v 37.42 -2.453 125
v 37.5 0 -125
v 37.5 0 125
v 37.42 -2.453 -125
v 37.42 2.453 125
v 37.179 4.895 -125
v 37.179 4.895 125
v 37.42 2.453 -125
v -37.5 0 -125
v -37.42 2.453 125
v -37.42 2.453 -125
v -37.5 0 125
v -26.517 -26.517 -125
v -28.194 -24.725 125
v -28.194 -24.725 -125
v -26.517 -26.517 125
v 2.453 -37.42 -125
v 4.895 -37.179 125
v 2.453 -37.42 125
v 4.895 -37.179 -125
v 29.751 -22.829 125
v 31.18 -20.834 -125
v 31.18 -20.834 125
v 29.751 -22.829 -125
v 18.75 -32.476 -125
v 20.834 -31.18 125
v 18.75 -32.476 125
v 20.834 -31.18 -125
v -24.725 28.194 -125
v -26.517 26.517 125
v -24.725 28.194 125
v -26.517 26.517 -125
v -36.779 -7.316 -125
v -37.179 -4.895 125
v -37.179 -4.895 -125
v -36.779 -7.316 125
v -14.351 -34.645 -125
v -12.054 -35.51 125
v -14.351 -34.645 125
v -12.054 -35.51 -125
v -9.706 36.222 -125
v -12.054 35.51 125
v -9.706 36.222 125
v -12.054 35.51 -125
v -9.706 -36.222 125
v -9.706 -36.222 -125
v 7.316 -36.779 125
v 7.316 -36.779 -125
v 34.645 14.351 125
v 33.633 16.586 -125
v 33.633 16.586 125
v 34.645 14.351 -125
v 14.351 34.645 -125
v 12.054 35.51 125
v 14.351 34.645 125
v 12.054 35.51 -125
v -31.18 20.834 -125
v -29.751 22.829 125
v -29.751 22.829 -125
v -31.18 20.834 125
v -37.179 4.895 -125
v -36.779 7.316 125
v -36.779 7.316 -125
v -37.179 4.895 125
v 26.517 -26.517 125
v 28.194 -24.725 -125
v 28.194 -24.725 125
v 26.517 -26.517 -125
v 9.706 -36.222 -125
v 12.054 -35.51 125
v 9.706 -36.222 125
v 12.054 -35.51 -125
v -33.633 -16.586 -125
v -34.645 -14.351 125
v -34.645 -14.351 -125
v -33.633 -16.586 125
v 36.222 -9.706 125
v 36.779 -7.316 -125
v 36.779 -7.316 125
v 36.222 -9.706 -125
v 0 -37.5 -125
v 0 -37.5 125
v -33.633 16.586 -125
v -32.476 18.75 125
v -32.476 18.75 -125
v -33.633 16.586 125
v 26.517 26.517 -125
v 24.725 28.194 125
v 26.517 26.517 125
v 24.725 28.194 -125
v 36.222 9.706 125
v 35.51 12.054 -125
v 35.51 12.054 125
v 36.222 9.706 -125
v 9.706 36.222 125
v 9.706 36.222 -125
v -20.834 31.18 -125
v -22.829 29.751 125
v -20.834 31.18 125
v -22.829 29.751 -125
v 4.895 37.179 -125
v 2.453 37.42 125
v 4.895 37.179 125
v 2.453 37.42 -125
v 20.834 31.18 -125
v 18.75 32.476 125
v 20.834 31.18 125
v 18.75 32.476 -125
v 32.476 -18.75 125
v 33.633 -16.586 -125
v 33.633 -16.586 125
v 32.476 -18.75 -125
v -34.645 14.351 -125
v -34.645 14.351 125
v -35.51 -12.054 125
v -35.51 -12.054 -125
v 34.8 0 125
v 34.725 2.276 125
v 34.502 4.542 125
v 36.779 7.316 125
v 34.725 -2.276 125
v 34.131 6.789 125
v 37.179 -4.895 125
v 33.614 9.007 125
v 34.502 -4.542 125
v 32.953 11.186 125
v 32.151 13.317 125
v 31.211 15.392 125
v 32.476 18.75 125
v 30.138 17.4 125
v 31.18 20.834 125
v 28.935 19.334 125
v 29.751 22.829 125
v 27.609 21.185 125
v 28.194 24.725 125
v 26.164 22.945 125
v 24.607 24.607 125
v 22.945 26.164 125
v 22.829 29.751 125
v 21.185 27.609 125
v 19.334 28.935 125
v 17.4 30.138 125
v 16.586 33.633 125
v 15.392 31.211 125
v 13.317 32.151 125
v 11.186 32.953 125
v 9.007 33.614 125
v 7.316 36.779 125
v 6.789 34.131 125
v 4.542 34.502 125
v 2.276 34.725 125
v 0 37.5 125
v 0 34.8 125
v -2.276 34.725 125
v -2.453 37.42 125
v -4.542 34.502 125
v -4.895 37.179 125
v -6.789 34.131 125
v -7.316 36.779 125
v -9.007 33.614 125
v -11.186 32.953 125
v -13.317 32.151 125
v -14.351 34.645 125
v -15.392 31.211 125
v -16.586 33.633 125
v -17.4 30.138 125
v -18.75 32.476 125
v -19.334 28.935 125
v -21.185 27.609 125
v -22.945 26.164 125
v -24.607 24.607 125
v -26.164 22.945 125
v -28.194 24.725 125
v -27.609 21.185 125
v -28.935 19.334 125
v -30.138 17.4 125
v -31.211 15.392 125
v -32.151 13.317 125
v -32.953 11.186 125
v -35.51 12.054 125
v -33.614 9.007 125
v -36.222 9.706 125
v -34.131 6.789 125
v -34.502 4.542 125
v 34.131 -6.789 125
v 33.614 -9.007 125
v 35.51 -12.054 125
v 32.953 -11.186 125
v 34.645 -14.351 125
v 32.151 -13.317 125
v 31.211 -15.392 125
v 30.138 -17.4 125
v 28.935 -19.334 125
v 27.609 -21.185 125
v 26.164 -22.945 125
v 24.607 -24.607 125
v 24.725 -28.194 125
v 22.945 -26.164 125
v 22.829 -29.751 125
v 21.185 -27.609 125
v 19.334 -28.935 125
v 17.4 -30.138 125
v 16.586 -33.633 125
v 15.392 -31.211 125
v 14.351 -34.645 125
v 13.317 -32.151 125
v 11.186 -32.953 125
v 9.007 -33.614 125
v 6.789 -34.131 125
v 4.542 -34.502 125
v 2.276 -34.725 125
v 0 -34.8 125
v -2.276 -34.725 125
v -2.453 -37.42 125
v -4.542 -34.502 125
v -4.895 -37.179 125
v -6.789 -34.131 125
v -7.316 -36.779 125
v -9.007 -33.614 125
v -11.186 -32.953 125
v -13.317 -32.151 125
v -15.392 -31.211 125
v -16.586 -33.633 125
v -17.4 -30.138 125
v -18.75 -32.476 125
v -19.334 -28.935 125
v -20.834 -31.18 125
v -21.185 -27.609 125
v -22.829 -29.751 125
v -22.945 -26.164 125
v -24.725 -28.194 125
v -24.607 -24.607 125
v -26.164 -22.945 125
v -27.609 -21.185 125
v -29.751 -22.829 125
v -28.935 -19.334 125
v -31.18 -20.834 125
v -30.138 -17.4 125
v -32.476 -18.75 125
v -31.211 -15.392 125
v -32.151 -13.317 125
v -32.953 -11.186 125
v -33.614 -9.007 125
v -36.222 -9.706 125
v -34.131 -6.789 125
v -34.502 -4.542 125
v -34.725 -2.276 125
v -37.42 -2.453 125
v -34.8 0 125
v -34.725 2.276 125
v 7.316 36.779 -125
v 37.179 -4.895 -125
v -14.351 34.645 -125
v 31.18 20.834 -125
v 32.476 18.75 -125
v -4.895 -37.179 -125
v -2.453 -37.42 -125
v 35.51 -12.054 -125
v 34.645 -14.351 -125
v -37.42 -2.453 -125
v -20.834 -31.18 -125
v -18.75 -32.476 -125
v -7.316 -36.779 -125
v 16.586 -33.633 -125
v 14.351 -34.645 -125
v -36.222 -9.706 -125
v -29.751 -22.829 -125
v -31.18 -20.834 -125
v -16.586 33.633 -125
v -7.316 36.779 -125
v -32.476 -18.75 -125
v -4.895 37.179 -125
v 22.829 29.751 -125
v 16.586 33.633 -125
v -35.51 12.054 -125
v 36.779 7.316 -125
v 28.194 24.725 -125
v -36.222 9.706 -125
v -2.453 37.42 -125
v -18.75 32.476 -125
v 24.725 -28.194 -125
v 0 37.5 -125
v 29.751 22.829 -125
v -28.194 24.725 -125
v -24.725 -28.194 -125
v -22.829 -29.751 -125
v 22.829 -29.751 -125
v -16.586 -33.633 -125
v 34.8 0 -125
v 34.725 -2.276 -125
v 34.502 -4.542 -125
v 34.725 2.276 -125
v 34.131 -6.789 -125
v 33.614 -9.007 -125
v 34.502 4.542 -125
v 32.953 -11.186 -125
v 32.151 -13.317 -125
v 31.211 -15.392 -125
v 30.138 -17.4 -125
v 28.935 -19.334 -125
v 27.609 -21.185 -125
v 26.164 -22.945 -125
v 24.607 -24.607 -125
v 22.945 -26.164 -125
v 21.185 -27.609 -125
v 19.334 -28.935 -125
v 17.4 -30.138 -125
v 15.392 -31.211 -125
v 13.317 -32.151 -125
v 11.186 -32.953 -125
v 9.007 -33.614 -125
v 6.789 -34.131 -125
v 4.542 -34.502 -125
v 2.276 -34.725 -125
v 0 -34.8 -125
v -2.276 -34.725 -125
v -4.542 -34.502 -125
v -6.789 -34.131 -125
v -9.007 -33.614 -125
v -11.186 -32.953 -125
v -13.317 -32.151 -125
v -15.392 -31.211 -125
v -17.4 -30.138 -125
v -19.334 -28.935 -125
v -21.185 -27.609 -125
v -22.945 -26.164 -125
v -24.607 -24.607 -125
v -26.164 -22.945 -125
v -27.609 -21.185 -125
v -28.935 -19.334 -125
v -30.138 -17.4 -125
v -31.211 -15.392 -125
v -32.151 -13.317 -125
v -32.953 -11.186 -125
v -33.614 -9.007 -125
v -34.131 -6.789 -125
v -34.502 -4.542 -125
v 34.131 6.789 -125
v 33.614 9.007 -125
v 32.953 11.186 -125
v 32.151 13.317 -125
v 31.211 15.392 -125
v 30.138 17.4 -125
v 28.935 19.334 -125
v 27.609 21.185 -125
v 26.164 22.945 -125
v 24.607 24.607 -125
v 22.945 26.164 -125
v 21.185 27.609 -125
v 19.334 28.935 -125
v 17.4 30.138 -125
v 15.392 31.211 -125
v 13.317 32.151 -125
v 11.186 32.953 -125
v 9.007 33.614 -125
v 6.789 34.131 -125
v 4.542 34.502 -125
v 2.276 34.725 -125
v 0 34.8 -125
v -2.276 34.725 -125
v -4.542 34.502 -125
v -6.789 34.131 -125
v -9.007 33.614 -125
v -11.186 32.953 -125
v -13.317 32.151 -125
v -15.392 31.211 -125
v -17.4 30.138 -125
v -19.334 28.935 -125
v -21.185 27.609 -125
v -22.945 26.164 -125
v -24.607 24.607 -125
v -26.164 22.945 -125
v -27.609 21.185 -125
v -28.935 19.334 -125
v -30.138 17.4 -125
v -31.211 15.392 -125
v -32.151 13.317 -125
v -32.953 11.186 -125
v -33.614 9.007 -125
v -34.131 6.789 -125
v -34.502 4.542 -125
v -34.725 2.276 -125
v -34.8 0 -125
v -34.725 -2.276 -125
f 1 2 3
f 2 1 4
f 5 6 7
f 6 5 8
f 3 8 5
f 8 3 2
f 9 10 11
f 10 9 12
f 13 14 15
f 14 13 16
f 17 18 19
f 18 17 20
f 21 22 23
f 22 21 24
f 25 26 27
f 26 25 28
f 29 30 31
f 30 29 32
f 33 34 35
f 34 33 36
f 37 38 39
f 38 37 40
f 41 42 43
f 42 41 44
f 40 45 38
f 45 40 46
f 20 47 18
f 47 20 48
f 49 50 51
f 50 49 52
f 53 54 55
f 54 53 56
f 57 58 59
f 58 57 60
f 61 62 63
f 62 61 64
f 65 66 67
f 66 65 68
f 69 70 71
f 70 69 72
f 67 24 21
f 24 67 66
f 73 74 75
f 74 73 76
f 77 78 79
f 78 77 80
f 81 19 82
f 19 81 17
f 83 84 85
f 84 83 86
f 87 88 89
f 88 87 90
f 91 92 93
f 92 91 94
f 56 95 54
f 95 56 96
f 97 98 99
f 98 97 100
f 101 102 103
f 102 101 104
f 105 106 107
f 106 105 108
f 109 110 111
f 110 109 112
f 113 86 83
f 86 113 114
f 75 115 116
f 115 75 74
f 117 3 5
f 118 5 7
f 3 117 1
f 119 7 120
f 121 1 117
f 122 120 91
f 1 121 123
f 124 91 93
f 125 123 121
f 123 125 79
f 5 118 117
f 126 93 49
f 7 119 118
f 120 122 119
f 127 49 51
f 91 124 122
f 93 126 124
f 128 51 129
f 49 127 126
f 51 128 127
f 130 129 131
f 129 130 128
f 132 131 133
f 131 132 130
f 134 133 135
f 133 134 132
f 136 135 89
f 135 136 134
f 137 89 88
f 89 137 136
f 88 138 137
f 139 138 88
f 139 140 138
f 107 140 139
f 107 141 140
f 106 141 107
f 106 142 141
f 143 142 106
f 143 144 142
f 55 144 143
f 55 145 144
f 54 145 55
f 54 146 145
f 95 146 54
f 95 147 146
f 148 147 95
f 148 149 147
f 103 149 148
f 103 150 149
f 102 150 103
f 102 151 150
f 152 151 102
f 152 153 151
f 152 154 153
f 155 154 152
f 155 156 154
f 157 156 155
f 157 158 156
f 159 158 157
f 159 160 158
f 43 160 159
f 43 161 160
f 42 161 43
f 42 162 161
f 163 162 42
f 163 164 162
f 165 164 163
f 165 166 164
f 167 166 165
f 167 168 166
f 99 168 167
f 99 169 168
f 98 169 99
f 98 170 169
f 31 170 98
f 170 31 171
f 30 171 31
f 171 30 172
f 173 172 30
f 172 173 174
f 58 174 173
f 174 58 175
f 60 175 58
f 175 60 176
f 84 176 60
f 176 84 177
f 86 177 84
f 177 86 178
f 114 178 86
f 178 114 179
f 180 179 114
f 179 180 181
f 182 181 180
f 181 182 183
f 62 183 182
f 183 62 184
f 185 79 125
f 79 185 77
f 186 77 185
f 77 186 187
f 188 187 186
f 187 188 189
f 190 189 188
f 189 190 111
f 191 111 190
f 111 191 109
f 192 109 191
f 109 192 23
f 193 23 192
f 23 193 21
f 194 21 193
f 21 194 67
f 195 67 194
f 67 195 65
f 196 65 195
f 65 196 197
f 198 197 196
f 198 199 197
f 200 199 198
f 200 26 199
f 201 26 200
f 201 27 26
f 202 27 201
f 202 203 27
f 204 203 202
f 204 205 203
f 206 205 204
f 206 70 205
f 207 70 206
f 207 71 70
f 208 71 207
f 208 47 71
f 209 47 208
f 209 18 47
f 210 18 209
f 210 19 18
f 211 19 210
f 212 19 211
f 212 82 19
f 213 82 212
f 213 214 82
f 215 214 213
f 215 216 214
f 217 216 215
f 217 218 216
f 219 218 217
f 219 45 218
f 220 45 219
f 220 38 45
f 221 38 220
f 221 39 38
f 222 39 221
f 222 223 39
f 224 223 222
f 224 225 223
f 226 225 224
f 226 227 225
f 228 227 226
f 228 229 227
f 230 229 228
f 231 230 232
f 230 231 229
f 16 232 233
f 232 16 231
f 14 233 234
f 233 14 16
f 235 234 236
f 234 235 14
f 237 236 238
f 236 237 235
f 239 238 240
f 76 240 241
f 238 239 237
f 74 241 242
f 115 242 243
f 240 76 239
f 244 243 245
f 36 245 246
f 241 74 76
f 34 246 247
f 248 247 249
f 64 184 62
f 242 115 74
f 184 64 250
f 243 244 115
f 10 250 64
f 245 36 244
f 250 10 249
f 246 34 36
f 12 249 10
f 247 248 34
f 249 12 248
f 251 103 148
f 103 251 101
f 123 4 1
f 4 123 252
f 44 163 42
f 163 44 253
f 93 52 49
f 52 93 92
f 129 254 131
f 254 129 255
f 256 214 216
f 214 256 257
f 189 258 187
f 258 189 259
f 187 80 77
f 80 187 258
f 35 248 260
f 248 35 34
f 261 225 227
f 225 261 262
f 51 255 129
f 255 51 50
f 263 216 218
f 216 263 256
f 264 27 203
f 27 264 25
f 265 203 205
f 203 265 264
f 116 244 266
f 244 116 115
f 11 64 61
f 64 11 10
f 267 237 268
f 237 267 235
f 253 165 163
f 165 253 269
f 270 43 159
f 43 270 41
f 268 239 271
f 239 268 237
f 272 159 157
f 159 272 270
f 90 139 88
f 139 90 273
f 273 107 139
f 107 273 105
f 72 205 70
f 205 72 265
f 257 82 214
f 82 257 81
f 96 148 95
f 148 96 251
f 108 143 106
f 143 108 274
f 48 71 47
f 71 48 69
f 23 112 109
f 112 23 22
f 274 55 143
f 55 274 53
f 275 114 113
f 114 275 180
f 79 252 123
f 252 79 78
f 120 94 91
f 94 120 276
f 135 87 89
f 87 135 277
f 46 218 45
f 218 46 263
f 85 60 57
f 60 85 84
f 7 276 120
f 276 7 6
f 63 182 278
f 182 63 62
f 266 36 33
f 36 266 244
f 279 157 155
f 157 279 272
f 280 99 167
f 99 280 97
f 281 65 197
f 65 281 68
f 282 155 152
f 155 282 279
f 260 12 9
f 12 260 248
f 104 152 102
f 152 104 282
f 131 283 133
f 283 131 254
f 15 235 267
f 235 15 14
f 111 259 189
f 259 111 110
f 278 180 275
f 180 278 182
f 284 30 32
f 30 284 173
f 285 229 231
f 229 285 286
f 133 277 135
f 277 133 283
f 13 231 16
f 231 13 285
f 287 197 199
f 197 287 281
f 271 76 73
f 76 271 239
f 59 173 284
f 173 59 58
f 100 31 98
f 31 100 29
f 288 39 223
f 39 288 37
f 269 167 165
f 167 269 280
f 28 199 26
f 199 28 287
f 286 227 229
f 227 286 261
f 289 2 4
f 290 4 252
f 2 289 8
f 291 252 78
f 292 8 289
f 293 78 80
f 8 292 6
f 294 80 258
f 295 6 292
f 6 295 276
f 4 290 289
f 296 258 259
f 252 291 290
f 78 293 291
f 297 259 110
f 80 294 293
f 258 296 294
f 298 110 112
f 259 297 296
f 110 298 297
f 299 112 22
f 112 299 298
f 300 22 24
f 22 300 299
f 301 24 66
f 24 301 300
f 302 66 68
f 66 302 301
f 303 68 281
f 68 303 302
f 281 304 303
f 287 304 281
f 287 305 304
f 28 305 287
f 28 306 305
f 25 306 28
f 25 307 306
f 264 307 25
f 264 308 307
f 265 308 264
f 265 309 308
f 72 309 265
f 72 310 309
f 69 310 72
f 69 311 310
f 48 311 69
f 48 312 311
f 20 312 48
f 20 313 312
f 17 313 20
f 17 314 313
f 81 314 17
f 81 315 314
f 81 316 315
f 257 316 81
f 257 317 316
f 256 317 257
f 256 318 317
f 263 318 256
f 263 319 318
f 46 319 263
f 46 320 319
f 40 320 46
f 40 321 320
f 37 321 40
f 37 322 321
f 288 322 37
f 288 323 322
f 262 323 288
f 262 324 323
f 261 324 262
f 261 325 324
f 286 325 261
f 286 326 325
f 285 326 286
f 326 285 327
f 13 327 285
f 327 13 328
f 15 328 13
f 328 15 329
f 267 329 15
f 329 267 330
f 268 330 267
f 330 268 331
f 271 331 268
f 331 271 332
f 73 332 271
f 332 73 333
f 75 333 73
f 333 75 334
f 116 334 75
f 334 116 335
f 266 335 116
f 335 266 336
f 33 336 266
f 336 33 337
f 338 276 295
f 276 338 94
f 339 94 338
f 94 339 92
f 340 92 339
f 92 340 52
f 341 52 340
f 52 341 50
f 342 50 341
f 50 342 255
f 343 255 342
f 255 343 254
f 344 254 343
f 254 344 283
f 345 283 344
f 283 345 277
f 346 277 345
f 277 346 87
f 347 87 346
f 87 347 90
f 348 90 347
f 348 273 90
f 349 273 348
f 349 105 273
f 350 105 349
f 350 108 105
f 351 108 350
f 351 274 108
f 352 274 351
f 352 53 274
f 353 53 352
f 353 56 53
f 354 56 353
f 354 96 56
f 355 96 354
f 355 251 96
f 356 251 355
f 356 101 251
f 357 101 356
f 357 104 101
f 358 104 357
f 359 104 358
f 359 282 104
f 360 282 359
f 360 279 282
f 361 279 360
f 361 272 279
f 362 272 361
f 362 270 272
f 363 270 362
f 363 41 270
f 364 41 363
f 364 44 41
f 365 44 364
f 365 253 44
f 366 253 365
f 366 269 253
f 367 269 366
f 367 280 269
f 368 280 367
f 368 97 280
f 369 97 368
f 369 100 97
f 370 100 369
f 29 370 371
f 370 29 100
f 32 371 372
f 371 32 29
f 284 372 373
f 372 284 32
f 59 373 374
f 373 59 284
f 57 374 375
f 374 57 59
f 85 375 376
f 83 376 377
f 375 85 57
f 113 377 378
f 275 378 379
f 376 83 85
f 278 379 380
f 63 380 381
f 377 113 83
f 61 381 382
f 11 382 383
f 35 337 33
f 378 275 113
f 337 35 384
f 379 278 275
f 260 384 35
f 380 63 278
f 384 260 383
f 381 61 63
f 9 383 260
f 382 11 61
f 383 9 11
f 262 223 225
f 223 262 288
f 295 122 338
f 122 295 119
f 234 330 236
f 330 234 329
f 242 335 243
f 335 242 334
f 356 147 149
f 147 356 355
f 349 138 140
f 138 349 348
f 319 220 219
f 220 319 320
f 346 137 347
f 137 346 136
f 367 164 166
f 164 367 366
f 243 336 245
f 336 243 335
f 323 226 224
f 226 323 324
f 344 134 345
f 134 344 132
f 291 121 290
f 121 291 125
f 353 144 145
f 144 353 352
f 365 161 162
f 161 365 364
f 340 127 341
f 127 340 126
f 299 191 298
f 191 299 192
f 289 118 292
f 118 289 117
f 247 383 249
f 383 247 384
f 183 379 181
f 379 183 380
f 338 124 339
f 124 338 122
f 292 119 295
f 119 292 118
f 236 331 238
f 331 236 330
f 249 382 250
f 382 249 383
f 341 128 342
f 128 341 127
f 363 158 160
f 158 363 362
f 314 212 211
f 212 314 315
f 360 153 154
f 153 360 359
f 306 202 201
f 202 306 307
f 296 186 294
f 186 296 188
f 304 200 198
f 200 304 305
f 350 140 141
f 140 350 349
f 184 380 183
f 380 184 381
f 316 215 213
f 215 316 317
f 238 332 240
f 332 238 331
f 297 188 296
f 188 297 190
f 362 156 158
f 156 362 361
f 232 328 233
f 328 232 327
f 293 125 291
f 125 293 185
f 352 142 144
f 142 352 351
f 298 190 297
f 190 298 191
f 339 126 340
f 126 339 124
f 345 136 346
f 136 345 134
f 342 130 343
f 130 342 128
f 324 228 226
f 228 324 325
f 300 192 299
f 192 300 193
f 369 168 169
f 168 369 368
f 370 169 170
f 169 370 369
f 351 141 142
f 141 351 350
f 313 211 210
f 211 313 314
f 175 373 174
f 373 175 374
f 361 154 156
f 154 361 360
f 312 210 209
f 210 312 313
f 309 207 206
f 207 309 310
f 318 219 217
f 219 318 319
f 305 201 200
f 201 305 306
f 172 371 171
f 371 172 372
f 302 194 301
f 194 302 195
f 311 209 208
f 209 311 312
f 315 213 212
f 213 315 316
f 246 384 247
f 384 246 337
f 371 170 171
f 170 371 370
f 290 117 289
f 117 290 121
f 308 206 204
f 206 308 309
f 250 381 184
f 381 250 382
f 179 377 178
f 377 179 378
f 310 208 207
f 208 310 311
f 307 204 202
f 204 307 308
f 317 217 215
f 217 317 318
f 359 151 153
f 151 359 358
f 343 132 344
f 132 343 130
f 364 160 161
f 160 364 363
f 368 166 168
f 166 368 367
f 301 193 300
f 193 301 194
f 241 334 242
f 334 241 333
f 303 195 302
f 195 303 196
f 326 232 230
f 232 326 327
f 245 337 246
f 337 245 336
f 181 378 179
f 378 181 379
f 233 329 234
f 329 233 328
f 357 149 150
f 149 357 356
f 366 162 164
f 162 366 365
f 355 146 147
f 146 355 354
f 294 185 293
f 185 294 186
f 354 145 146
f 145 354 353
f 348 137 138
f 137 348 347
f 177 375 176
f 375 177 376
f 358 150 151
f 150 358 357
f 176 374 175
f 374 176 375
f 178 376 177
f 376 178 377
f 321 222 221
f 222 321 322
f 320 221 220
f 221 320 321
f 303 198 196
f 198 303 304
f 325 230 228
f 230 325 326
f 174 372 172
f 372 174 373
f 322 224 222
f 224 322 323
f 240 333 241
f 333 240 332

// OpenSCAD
$fn=96;

module ht_pipe(od=75, length=250, wall=2.7) {
    difference() {
        cylinder(h=length, d=od, center=true);
        cylinder(h=length+2, d=od-2*wall, center=true);
    }
}

ht_pipe(od=75, length=250, wall=2.7);
